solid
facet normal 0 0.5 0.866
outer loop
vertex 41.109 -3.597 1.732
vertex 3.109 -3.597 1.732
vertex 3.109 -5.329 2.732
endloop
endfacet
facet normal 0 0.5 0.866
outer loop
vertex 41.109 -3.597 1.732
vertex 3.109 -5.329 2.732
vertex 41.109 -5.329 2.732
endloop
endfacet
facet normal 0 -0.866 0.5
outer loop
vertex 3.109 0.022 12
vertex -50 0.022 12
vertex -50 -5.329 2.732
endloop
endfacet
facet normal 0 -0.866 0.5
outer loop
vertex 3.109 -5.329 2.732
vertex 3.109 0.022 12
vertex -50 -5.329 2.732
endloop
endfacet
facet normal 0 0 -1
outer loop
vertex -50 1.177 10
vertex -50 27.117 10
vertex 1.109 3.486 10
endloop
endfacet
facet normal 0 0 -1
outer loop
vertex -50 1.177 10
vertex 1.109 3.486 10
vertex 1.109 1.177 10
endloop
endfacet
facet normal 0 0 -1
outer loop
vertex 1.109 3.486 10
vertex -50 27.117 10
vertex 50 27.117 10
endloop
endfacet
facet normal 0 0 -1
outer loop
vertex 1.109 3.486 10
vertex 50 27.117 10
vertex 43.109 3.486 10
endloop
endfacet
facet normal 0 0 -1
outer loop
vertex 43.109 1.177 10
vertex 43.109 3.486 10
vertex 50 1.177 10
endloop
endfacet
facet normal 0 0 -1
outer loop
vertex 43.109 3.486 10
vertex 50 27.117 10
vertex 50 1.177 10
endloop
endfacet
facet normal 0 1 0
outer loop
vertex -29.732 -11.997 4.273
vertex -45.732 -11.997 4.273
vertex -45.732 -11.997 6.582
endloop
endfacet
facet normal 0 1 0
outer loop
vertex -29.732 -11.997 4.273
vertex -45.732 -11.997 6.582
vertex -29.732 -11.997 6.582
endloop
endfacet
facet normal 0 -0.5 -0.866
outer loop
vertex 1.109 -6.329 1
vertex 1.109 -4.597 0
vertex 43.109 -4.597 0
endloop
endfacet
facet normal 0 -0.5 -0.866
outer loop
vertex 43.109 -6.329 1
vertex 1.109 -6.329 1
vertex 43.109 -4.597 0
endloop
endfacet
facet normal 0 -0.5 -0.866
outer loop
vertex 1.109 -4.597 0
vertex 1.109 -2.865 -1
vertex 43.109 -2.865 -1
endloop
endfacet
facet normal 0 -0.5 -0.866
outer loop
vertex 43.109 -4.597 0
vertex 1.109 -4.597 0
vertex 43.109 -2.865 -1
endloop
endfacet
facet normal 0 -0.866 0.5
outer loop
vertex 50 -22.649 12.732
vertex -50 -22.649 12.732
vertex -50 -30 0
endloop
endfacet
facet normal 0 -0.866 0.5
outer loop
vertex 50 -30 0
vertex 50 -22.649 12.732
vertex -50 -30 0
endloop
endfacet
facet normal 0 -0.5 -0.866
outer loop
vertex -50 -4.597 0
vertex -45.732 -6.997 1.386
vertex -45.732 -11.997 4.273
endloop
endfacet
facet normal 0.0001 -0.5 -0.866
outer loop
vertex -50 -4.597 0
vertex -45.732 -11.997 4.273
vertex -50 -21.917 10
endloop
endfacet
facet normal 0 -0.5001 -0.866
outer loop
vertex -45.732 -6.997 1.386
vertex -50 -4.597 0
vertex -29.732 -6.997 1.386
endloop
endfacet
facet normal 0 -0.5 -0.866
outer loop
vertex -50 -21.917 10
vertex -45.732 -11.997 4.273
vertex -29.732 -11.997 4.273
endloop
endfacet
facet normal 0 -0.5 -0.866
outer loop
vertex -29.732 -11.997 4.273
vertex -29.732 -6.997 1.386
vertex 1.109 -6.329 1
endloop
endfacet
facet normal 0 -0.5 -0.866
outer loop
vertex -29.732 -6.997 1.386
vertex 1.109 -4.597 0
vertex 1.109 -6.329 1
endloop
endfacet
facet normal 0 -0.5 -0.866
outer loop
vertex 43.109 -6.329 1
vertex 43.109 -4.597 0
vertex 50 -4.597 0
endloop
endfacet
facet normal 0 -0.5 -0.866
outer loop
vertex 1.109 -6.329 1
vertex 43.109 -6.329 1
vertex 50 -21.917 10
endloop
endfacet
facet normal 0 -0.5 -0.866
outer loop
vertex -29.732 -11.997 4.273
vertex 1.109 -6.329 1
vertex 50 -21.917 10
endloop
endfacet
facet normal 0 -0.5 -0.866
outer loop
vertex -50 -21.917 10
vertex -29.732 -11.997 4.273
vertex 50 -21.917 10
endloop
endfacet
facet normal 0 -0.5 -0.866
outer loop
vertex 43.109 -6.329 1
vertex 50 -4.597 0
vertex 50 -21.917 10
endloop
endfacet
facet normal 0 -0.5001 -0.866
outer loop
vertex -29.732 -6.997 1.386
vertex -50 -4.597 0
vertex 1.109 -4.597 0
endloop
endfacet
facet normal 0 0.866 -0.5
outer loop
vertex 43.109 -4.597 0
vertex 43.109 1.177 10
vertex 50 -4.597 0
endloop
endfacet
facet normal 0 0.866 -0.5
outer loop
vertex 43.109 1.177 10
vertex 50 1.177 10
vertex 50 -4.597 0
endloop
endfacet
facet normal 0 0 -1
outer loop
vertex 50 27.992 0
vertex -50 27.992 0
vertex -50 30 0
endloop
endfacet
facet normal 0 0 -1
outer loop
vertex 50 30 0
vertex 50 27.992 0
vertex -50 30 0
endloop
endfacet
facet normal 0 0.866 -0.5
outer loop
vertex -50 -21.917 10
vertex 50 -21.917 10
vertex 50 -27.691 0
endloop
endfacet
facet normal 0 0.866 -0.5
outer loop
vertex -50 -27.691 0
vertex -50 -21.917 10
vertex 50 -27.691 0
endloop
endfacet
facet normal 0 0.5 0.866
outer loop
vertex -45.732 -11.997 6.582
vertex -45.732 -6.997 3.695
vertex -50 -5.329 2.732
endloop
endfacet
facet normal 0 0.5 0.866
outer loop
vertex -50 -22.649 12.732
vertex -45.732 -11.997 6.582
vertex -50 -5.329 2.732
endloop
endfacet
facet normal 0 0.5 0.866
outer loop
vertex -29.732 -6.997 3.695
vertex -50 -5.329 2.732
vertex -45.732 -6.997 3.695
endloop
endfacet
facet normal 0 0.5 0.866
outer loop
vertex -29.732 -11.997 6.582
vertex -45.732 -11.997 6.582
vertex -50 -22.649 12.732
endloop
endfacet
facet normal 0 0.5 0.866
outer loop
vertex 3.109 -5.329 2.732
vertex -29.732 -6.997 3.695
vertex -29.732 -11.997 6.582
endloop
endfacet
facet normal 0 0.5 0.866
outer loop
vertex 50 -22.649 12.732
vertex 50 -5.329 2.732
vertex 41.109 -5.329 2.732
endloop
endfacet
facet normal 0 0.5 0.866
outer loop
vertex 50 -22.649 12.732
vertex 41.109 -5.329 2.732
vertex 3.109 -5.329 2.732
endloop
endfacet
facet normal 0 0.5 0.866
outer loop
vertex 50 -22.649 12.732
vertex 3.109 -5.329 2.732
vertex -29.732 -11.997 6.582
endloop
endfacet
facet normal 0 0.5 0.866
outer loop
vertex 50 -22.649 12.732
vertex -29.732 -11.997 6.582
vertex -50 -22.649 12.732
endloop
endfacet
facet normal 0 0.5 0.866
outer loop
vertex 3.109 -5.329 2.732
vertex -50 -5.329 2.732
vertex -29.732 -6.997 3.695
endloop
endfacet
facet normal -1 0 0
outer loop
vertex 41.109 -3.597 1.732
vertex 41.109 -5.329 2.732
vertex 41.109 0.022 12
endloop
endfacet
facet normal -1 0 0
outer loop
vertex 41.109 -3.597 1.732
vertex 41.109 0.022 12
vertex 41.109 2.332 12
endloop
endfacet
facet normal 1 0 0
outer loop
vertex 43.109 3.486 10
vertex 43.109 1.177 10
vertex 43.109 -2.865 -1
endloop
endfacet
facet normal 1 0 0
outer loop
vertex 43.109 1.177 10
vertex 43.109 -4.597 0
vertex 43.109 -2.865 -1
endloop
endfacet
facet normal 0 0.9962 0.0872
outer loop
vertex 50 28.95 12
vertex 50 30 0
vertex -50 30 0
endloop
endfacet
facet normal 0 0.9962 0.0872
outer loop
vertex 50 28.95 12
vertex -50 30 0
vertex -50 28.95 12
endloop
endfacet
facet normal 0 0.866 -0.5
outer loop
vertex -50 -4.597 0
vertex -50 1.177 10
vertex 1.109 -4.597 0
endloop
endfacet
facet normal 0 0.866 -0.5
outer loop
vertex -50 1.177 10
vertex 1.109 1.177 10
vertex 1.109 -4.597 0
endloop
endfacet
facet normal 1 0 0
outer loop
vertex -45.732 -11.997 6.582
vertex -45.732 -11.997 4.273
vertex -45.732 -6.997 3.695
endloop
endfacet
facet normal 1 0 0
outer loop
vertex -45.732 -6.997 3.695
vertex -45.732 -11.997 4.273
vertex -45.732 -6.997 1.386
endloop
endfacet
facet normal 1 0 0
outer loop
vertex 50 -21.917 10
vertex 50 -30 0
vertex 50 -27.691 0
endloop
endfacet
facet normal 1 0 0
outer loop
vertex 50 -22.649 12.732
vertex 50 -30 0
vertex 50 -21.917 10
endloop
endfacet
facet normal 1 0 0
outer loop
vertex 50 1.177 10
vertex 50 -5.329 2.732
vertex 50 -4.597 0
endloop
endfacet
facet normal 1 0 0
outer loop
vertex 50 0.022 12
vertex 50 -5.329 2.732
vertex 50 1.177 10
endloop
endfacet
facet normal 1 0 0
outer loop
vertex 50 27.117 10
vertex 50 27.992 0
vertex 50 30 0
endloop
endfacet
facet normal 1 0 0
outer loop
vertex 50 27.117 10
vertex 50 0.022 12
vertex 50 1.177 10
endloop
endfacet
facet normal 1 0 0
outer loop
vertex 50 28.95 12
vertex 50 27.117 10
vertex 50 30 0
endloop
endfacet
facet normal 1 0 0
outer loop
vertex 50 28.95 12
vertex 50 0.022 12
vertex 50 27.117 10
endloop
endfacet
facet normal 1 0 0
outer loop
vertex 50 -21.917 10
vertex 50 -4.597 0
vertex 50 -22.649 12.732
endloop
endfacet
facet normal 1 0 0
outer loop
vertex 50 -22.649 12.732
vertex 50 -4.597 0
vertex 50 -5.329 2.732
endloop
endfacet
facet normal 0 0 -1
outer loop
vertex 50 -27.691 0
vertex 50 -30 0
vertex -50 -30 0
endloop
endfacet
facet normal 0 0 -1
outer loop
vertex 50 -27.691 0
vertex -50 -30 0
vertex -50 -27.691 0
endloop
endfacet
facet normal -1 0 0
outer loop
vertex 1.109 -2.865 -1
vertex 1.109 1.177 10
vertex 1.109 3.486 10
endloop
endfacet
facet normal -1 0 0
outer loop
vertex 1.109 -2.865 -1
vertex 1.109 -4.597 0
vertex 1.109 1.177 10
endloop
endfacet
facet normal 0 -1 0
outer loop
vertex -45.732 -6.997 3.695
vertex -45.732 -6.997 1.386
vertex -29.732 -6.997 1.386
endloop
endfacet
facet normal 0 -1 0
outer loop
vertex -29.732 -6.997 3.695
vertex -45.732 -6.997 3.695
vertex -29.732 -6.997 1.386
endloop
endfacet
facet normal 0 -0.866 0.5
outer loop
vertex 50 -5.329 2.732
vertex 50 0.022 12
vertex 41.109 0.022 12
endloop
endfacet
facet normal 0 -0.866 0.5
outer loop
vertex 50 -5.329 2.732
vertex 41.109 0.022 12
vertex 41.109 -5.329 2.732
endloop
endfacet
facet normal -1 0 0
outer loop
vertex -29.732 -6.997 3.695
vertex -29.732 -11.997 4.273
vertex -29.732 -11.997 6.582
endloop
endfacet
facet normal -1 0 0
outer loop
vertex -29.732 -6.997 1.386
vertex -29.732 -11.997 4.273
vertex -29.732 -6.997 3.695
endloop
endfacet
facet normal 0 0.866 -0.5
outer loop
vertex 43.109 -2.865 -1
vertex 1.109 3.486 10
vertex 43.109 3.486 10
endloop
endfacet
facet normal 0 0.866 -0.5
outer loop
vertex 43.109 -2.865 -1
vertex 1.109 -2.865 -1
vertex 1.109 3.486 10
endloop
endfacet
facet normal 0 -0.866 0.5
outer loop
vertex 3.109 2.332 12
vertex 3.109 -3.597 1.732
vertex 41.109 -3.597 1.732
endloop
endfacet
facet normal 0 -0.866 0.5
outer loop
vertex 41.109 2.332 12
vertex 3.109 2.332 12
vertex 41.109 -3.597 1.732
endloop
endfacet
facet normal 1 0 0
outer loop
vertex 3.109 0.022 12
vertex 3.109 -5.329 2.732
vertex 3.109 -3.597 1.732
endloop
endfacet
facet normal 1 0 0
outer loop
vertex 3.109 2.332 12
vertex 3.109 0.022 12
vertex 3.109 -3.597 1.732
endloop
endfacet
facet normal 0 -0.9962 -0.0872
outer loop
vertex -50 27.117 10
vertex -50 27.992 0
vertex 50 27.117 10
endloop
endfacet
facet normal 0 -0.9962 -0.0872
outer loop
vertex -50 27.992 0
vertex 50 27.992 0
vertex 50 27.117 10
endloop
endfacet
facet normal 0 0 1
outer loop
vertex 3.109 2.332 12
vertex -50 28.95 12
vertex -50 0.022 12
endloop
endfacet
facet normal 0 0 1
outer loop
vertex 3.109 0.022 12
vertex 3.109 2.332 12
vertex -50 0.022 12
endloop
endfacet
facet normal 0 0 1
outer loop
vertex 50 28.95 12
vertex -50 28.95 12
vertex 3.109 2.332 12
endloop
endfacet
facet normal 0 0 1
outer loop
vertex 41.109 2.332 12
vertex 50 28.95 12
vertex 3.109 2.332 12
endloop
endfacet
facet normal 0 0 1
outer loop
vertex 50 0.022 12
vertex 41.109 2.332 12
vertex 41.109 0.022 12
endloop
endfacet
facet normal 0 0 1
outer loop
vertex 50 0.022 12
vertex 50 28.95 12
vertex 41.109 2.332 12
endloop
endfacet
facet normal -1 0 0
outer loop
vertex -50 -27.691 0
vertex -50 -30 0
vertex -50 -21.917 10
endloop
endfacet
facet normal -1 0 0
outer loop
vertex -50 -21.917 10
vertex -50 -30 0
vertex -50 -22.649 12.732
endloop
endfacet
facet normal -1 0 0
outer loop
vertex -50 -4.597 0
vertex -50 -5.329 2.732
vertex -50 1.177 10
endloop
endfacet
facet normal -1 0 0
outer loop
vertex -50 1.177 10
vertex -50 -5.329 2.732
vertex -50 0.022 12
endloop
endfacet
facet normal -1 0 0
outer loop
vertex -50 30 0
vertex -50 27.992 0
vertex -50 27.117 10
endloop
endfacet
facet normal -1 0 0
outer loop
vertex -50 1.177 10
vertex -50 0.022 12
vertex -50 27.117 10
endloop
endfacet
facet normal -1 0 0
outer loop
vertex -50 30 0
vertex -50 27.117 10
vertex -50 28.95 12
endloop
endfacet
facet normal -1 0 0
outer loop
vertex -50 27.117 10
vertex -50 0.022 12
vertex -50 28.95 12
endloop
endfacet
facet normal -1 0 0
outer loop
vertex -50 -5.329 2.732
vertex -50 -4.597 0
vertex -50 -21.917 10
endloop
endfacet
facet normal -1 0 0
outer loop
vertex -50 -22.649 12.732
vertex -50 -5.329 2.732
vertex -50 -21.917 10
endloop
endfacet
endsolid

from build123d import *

# Parameters (mm, degrees)
F1_DEPTH = 50
F2_W     = 38
F2_H     = 2
F3_DEPTH = 26.3255735195
F4_T     = -2
F5_W     = 16
F5_H     = 5
F6_DEPTH = 12.7330508076


with BuildPart() as f1:
    # F0 (on Right) → F1 (new body, symmetric)
    with BuildSketch(Plane.YZ):
        Polygon((-22.6491470389, 12.7320508076), (-30, 0), (30, 0), (28.9501360377, 12), (0.0222139979, 12), (-5.3286389632, 2.7320508076), align=None)
    extrude(amount=F1_DEPTH, both=True)

    # F2 (on face) → F3 (cut, through all)
    with BuildSketch(Plane(origin=(0, -0.1491470389, -0.2583302492), x_dir=(1, 0, 0), z_dir=(0, 0.5, 0.8660254038))):
        with Locations((22.1086753011, -4.9807621135)):
            Rectangle(F2_W, F2_H)
    extrude(amount=F3_DEPTH, mode=Mode.SUBTRACT)

    # F4
    f4_openings = [f1.faces().sort_by_distance(p)[0] for p in [
        (0, 0, 0),
        (50, 3.195409, 5.336498),
        (-50, 3.195409, 5.336498),
    ]]
    offset(amount=F4_T, openings=f4_openings, kind=Kind.INTERSECTION)

    # F5 (on Top) → F6 (cut, through all)
    with BuildSketch(Plane.XY):
        with Locations((-37.7319419413, -9.4969761558)):
            Rectangle(F5_W, F5_H)
    extrude(amount=F6_DEPTH, mode=Mode.SUBTRACT)


solid = f1.part
